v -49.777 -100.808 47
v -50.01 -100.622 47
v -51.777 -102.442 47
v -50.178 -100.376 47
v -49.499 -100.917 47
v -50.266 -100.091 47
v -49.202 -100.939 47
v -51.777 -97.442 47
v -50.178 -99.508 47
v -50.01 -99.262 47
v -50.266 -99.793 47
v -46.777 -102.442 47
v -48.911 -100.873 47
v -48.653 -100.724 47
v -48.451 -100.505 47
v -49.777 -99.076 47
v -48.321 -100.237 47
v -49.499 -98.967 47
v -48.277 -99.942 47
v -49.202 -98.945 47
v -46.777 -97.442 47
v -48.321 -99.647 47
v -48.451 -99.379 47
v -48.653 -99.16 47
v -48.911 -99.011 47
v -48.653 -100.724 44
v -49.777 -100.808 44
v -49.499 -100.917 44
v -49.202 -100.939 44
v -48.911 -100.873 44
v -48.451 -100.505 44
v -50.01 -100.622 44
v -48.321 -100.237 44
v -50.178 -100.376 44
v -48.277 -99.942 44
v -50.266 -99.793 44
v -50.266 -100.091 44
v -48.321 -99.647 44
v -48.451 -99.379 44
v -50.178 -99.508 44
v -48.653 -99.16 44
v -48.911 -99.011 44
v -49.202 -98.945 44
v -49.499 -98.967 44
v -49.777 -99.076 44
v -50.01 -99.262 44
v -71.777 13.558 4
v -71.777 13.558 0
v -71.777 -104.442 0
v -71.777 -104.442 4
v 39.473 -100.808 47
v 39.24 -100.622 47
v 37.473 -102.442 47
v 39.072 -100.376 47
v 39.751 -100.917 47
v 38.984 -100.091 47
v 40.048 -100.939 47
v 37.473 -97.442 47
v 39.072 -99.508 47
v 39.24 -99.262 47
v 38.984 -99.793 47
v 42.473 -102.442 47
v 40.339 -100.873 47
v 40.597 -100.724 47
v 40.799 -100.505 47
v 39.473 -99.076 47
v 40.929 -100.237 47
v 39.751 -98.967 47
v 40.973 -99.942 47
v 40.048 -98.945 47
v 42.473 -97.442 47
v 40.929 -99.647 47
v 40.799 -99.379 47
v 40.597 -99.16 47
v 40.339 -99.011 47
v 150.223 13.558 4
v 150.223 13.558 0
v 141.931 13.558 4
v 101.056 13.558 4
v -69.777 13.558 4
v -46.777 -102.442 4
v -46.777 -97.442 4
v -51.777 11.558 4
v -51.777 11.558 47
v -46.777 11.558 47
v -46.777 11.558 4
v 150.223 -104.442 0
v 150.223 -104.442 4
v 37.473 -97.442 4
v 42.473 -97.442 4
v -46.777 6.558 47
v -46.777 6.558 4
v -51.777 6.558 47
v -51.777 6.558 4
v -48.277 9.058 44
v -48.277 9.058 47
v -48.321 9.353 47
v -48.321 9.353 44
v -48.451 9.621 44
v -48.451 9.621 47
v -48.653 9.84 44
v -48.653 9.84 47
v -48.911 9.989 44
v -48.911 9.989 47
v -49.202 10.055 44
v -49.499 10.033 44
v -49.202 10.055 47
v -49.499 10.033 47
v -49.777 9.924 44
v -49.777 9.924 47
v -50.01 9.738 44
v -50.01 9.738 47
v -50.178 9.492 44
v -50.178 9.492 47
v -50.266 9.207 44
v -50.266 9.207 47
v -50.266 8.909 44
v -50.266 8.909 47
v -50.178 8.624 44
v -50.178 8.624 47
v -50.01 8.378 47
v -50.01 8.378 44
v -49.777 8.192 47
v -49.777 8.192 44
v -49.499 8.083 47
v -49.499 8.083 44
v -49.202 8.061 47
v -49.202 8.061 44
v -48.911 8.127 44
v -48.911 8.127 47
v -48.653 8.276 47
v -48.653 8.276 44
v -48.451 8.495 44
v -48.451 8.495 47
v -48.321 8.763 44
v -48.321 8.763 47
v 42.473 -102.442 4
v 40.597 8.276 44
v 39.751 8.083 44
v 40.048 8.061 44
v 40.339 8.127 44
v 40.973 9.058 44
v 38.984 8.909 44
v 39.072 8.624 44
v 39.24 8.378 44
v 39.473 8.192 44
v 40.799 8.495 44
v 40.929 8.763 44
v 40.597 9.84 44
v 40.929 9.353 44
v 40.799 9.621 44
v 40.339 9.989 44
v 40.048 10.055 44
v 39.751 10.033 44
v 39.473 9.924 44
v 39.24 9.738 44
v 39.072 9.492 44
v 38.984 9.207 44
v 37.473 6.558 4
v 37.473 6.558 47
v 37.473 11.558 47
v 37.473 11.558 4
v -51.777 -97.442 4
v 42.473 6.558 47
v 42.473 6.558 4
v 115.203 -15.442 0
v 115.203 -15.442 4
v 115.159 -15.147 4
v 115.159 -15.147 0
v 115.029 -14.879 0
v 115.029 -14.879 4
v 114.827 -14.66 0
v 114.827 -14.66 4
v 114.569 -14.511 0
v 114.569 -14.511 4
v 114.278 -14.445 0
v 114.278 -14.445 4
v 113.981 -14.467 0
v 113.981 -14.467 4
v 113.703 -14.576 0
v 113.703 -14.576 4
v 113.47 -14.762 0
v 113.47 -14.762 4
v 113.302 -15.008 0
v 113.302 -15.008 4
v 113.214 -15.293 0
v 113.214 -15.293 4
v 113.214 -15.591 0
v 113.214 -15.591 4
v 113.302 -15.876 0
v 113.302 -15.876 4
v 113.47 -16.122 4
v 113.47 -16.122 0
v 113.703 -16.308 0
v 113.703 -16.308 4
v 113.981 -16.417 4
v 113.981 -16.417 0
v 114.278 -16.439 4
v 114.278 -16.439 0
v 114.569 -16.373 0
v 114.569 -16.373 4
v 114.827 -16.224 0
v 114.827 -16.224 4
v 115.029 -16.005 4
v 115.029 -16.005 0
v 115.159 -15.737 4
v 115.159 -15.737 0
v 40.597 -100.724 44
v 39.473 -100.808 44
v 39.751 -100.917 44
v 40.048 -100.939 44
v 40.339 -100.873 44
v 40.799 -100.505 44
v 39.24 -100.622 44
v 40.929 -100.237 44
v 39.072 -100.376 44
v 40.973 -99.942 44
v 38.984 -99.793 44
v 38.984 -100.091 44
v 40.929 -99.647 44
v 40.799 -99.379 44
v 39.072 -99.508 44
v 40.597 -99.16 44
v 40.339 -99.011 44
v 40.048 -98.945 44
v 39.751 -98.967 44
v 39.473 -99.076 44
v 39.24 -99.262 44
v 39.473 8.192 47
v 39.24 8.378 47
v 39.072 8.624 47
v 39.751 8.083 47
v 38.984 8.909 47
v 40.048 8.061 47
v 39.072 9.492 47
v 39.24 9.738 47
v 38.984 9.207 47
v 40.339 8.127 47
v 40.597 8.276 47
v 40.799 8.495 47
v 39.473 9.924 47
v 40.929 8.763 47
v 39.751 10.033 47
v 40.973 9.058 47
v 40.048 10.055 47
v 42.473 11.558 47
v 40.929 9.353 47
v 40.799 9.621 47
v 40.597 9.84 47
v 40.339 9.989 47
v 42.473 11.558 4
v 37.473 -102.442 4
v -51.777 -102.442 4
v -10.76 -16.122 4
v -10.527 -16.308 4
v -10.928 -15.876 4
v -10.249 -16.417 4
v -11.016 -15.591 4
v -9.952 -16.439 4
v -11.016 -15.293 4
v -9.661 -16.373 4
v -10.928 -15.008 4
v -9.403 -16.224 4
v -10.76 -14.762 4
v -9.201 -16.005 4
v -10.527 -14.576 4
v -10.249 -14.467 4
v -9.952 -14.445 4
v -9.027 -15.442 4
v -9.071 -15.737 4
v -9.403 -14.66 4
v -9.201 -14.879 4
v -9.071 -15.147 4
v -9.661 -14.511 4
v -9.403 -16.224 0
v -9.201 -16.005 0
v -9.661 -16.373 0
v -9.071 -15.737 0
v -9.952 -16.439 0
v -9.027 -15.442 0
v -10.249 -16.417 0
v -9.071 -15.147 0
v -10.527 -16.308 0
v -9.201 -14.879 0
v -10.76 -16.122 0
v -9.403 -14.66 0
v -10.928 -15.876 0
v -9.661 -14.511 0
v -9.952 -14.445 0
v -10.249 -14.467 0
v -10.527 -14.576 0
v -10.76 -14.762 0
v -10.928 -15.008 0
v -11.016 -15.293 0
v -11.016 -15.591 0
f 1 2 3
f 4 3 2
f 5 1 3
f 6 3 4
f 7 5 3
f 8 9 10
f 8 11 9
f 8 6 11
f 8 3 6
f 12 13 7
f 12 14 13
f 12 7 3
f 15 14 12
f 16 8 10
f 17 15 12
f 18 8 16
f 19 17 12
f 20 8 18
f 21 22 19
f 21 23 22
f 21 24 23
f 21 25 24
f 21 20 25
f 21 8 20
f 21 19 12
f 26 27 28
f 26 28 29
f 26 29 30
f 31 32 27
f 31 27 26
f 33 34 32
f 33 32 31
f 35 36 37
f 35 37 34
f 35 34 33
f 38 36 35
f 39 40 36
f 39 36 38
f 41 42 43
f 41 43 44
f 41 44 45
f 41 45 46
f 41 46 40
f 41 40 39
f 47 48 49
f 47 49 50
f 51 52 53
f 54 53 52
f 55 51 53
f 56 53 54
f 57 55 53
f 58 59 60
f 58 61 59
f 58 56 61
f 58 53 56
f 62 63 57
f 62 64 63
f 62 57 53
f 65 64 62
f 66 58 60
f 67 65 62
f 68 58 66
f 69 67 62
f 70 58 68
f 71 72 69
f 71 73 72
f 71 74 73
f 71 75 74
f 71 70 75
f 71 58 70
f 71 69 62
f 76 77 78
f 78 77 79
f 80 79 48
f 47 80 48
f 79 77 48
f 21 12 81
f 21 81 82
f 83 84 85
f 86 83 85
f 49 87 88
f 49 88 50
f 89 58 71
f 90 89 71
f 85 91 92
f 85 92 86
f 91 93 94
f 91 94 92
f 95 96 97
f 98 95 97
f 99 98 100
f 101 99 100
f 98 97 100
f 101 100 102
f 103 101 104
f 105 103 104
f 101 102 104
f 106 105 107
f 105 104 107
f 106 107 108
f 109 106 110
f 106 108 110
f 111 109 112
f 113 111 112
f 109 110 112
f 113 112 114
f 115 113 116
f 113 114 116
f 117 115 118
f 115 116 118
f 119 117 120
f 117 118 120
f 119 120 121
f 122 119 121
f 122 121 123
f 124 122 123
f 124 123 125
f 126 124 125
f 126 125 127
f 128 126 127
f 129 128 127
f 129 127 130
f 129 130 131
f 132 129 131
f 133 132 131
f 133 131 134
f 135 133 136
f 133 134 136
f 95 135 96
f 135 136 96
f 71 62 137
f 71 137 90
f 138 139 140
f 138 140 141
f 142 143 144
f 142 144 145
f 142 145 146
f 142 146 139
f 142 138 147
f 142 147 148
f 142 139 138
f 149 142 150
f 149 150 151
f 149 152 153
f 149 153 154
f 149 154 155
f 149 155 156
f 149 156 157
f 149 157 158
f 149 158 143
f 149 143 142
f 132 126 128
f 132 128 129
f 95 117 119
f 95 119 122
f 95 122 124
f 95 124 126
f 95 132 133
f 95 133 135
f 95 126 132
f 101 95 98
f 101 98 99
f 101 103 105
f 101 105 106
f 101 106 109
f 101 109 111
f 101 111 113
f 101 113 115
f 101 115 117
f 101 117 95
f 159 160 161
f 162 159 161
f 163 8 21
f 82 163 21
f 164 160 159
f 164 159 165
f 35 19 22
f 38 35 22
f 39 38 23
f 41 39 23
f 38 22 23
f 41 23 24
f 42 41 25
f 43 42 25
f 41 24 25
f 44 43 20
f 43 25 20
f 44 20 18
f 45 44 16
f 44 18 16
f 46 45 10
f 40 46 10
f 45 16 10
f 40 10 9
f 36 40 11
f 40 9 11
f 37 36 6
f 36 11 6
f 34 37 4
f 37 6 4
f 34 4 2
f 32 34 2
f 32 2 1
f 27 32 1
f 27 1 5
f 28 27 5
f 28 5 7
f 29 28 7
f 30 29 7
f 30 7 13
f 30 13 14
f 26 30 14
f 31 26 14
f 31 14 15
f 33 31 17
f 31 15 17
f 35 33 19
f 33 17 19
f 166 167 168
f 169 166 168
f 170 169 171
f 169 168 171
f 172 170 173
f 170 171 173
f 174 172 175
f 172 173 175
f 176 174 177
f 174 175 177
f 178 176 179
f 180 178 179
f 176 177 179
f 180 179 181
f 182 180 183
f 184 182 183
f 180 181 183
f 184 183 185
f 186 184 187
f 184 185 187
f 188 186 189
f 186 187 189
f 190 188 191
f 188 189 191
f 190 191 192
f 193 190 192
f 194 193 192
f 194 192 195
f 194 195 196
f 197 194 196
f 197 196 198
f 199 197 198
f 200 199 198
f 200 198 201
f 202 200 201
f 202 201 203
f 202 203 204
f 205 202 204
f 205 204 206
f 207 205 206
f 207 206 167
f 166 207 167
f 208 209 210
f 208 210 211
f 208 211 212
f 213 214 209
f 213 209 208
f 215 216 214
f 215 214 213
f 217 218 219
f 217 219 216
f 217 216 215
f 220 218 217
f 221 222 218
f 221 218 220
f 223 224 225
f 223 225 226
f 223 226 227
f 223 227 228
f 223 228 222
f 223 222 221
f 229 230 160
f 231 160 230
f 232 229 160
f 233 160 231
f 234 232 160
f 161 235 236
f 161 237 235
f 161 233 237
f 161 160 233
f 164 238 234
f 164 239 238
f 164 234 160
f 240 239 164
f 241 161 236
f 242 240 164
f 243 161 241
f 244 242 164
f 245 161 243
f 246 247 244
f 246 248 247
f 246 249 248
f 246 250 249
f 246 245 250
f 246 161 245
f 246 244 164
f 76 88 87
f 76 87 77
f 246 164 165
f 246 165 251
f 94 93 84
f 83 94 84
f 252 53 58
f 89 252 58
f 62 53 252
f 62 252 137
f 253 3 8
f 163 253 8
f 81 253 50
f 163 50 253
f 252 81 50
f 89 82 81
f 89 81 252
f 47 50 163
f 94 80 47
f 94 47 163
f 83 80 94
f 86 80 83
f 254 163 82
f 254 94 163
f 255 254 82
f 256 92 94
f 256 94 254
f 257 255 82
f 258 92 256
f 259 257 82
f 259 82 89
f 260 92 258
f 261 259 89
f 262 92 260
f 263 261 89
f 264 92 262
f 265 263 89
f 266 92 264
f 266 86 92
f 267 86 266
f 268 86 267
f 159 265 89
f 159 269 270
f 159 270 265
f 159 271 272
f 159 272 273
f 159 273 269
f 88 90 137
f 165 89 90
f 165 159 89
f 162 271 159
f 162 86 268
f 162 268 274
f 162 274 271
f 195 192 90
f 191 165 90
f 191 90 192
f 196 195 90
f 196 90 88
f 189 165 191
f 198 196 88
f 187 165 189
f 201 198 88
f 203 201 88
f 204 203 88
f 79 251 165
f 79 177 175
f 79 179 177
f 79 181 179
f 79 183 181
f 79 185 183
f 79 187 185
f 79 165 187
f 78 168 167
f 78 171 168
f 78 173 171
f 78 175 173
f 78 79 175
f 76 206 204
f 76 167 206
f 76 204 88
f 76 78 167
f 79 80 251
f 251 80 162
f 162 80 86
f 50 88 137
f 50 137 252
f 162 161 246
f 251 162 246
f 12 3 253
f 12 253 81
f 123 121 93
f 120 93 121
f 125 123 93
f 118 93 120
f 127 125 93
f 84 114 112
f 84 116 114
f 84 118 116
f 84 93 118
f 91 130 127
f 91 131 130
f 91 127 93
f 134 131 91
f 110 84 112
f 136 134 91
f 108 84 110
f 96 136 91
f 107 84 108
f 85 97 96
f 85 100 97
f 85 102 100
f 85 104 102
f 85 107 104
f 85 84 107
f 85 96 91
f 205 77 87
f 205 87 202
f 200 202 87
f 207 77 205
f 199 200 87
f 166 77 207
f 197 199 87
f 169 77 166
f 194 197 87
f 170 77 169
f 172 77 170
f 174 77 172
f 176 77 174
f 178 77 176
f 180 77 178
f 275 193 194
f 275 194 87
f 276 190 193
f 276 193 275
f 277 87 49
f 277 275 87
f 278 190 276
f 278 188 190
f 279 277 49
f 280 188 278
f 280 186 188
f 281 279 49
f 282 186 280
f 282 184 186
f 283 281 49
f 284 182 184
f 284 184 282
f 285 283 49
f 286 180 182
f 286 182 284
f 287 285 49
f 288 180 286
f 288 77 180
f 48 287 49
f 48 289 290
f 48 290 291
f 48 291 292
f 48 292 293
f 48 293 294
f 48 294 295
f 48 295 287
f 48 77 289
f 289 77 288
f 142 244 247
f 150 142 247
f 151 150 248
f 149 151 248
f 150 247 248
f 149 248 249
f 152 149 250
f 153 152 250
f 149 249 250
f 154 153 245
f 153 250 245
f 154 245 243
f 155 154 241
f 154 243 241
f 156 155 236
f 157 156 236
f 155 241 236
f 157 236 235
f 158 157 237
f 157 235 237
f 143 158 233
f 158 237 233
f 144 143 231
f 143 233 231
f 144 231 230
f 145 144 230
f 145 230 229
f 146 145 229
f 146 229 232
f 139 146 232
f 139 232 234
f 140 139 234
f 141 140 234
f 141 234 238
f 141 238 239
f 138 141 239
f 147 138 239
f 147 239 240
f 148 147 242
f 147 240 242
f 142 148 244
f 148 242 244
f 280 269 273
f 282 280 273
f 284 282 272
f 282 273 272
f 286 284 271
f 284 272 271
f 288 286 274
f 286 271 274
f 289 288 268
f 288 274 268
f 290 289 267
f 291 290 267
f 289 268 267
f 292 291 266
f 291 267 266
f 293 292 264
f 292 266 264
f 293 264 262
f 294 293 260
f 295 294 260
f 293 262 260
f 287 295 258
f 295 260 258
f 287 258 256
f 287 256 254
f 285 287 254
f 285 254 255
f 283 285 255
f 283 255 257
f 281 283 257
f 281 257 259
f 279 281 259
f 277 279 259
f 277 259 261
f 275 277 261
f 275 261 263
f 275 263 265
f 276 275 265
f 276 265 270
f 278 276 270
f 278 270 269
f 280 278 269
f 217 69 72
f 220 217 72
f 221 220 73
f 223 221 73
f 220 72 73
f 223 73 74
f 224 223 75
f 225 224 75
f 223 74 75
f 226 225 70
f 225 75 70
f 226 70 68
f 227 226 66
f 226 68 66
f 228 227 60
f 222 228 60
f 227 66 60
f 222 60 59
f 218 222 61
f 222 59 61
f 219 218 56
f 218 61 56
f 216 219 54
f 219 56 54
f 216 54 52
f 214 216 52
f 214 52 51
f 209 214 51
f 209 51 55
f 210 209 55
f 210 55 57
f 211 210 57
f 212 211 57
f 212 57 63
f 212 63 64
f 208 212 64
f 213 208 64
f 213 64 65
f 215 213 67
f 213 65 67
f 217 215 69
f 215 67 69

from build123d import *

# Parameters (mm, degrees)
SKETCH1_W            = 200
SKETCH1_H            = 150
BOSS_EXTRUDE1_DEPTH  = 4
SKETCH2_W            = 4
SKETCH2_H            = 150
BOSS_EXTRUDE2_DEPTH  = 50
SKETCH3_R            = 1
CUT_EXTRUDE1_DEPTH   = 21
SKETCH4_R            = 1
CUT_EXTRUDE2_DEPTH   = 21
SKETCH5_R            = 1
CUT_EXTRUDE3_DEPTH   = 21
SKETCH6_R            = 1
CUT_EXTRUDE4_DEPTH   = 5
SKETCH7_R            = 6.144102529
BOSS_EXTRUDE3_DEPTH  = 4
SKETCH8_W            = 5
SKETCH8_H            = 5
BOSS_EXTRUDE4_DEPTH  = 43
SKETCH9_W            = 5
SKETCH9_H            = 5
BOSS_EXTRUDE5_DEPTH  = 43
SKETCH10_W           = 5
SKETCH10_H           = 5
BOSS_EXTRUDE6_DEPTH  = 43
SKETCH11_W           = 30
SKETCH11_H           = 150
CUT_EXTRUDE5_DEPTH   = 10
SKETCH12_W           = 220
SKETCH12_H           = 24.5
CUT_EXTRUDE6_DEPTH   = 10
SKETCH13_W           = 40.875499452
SKETCH13_H           = 23.792139599
SKETCH13_W_2         = 30.776846646
SKETCH13_H_2         = 32.17722556
CUT_EXTRUDE7_DEPTH   = 43
SKETCH14_W           = 220
SKETCH14_H           = 7.5
CUT_EXTRUDE8_DEPTH   = 10
SKETCH15_W           = 2
SKETCH15_H           = 118
BOSS_EXTRUDE7_DEPTH  = 47
SKETCH17_W           = 7
SKETCH17_H           = 7
BOSS_EXTRUDE8_DEPTH  = 10
SKETCH18_R           = 2.5
CUT_EXTRUDE9_DEPTH   = 9
SKETCH19_R           = 1
BOSS_EXTRUDE9_DEPTH  = 9
FILLET1_R            = 1
SKETCH20_W           = 7.2
SKETCH20_H           = 14.5
BOSS_EXTRUDE10_DEPTH = 10
SKETCH21_W           = 4.962321038
SKETCH21_H           = 12.373907849
CUT_EXTRUDE10_DEPTH  = 9
SKETCH22_W           = 0.777431132
SKETCH22_H           = 9.230205418
BOSS_EXTRUDE11_DEPTH = 8
SKETCH23_W           = 0.590875022
SKETCH23_H           = 0.8
SKETCH23_H_2         = 0.836280482
SKETCH23_H_3         = 0.787087512
BOSS_EXTRUDE12_DEPTH = 7
SKETCH24_W           = 5
SKETCH24_H           = 5
BOSS_EXTRUDE13_DEPTH = 43
SKETCH25_W           = 5
SKETCH25_H           = 5
BOSS_EXTRUDE14_DEPTH = 43
CUT_EXTRUDE11_START  = -43
SKETCH26_W           = 5
SKETCH26_H           = 5
CUT_EXTRUDE11_DEPTH  = 43
SKETCH27_W           = 5
SKETCH27_H           = 5
BOSS_EXTRUDE15_DEPTH = 43
CUT_EXTRUDE12_START  = -43
SKETCH28_W           = 5
SKETCH28_H           = 5
CUT_EXTRUDE12_DEPTH  = 43
SKETCH29_W           = 2
SKETCH29_H           = 66.409922273
BOSS_EXTRUDE16_DEPTH = 47
SKETCH30_W           = 8
SKETCH30_H           = 7
SKETCH30_H_2         = 14.5
CUT_EXTRUDE13_DEPTH  = 9.5
SKETCH31_W           = 5
SKETCH31_H           = 5
CUT_EXTRUDE14_DEPTH  = 43
SKETCH32_W           = 5
SKETCH32_H           = 5
BOSS_EXTRUDE17_DEPTH = 43
SKETCH35_W           = 5
SKETCH35_H           = 5
BOSS_EXTRUDE18_DEPTH = 43
SKETCH37_R           = 1
CUT_EXTRUDE16_DEPTH  = 3
CUT_EXTRUDE17_START  = -43
SKETCH38_W           = 2
SKETCH38_H           = 118
CUT_EXTRUDE17_DEPTH  = 43
SKETCH39_W           = 5
SKETCH39_H           = 5
BOSS_EXTRUDE19_DEPTH = 43
CUT_EXTRUDE18_START  = -43
SKETCH40_W           = 5
SKETCH40_H           = 5
CUT_EXTRUDE18_DEPTH  = 43
SKETCH41_R           = 1
CUT_EXTRUDE19_DEPTH  = 3
CUT_EXTRUDE20_START  = -43
SKETCH42_W           = 21.919538156
SKETCH42_H           = 26.204036761
CUT_EXTRUDE20_DEPTH  = 43
SKETCH43_W           = 59.077186418
SKETCH43_H           = 35.909235562
BOSS_EXTRUDE20_DEPTH = 4


with BuildPart() as part:
    # Sketch1 → Boss-Extrude1 (new body)
    with BuildSketch(Plane.XY):
        with Locations((0.223214286, -36.941964286)):
            Rectangle(SKETCH1_W, SKETCH1_H)
    extrude(amount=BOSS_EXTRUDE1_DEPTH)

    # Sketch2 → Boss-Extrude2 (add)
    with BuildSketch(Plane(origin=(100.223214286, 0, 0), x_dir=(0, 0, -1), z_dir=(1, 0, 0))):
        with Locations((-2, -36.941964286)):
            Rectangle(SKETCH2_W, SKETCH2_H)
    extrude(amount=BOSS_EXTRUDE2_DEPTH)

    # Sketch3 → Cut-Extrude1 (cut)
    with BuildSketch(Plane(origin=(0, 0, 0), x_dir=(-1, 0, 0), z_dir=(0, 0, -1))):
        with Locations((96.776785714, -77.941964286)):
            Circle(SKETCH3_R)
    extrude(amount=-CUT_EXTRUDE1_DEPTH, mode=Mode.SUBTRACT)

    # Sketch4 → Cut-Extrude2 (cut)
    with BuildSketch(Plane(origin=(0, 0, 0), x_dir=(-1, 0, 0), z_dir=(0, 0, -1))):
        with Locations((-147.223214286, -77.941964286)):
            Circle(SKETCH4_R)
    extrude(amount=-CUT_EXTRUDE2_DEPTH, mode=Mode.SUBTRACT)

    # Sketch5 → Cut-Extrude3 (cut)
    with BuildSketch(Plane(origin=(0, 0, 0), x_dir=(-1, 0, 0), z_dir=(0, 0, -1))):
        with Locations((-99.423214286, -77.941964286)):
            Circle(SKETCH5_R)
    extrude(amount=-CUT_EXTRUDE3_DEPTH, mode=Mode.SUBTRACT)

    # Sketch6 → Cut-Extrude4 (cut, through all)
    with BuildSketch(Plane.XY.offset(4)):
        with Locations((114.203214286, -15.441964286)):
            Circle(SKETCH6_R)
        with Locations((-10.026785714, -15.441964286)):
            Circle(SKETCH6_R)
    extrude(amount=-CUT_EXTRUDE4_DEPTH, mode=Mode.SUBTRACT)

    # Sketch7 → Boss-Extrude3 (add)
    with BuildSketch(Plane(origin=(0, 0, 0), x_dir=(-1, 0, 0), z_dir=(0, 0, -1))):
        with Locations((93.632683185, -80.249228077)):
            Circle(SKETCH7_R)
    extrude(amount=-BOSS_EXTRUDE3_DEPTH)

    # Sketch8 → Boss-Extrude4 (add)
    with BuildSketch(Plane.XY.offset(4)):
        with Locations((-10.026785714, 9.058035714)):
            Rectangle(SKETCH8_W, SKETCH8_H)
        with Locations((113.836980241, 9.058035714)):
            Rectangle(SKETCH8_W, SKETCH8_H)
    extrude(amount=BOSS_EXTRUDE4_DEPTH)

    # Sketch9 → Boss-Extrude5 (add)
    with BuildSketch(Plane.XY.offset(4)):
        with Locations((39.973214286, 9.058035714)):
            Rectangle(SKETCH9_W, SKETCH9_H)
    extrude(amount=BOSS_EXTRUDE5_DEPTH)

    # Sketch10 → Boss-Extrude6 (add)
    with BuildSketch(Plane.XY.offset(4)):
        with Locations((-65.026785714, 9.058035714)):
            Rectangle(SKETCH10_W, SKETCH10_H)
    extrude(amount=BOSS_EXTRUDE6_DEPTH)

    # Sketch11 → Cut-Extrude5 (cut)
    with BuildSketch(Plane.XY.offset(4)):
        with Locations((-84.776785714, -36.941964286)):
            Rectangle(SKETCH11_W, SKETCH11_H)
    extrude(amount=-CUT_EXTRUDE5_DEPTH, mode=Mode.SUBTRACT)

    # Sketch12 → Cut-Extrude6 (cut)
    with BuildSketch(Plane.XY.offset(4)):
        with Locations((40.223214286, 25.808035714)):
            Rectangle(SKETCH12_W, SKETCH12_H)
    extrude(amount=-CUT_EXTRUDE6_DEPTH, mode=Mode.SUBTRACT)

    # Sketch13 → Cut-Extrude7 (cut)
    with BuildSketch(Plane.XY.offset(47)):
        with Locations((121.493324961, 1.661965914)):
            Rectangle(SKETCH13_W, SKETCH13_H)
        with Locations((-5.461167455, 0)):
            Rectangle(SKETCH13_W_2, SKETCH13_H_2)
    extrude(amount=-CUT_EXTRUDE7_DEPTH, mode=Mode.SUBTRACT)

    # Sketch14 → Cut-Extrude8 (cut)
    with BuildSketch(Plane.XY.offset(4)):
        with Locations((40.223214286, -108.191964286)):
            Rectangle(SKETCH14_W, SKETCH14_H)
    extrude(amount=-CUT_EXTRUDE8_DEPTH, mode=Mode.SUBTRACT)

    # Sketch15 → Boss-Extrude7 (add)
    with BuildSketch(Plane(origin=(0, 0, 0), x_dir=(-1, 0, 0), z_dir=(0, 0, -1))):
        with Locations((70.776785714, -45.441964286)):
            Rectangle(SKETCH15_W, SKETCH15_H)
    extrude(amount=-BOSS_EXTRUDE7_DEPTH)

    # Sketch17 → Boss-Extrude8 (add)
    with BuildSketch(Plane.ZY.offset(71.776785714)):
        with Locations((10, -45.441964286)):
            Rectangle(SKETCH17_W, SKETCH17_H)
    extrude(amount=-BOSS_EXTRUDE8_DEPTH)

    # Sketch18 → Cut-Extrude9 (cut)
    with BuildSketch(Plane.ZY.offset(71.776785714)):
        with Locations((10, -45.441964286)):
            Circle(SKETCH18_R)
    extrude(amount=-CUT_EXTRUDE9_DEPTH, mode=Mode.SUBTRACT)

    # Sketch20 → Boss-Extrude10 (add)
    with BuildSketch(Plane.ZY.offset(71.776785714)):
        with Locations((9.71931332, -90.191964286)):
            Rectangle(SKETCH20_W, SKETCH20_H)
    extrude(amount=-BOSS_EXTRUDE10_DEPTH)

    # Sketch21 → Cut-Extrude10 (cut)
    with BuildSketch(Plane.ZY.offset(71.776785714)):
        with Locations((9.788933034, -90.191964286)):
            Rectangle(SKETCH21_W, SKETCH21_H)
    extrude(amount=-CUT_EXTRUDE10_DEPTH, mode=Mode.SUBTRACT)

    # Sketch22 → Boss-Extrude11 (add)
    with BuildSketch(Plane.ZY.offset(62.776785714)):
        with Locations((9.788933034, -90.191964286)):
            Rectangle(SKETCH22_W, SKETCH22_H)
    extrude(amount=BOSS_EXTRUDE11_DEPTH)

    # Sketch23 → Boss-Extrude12 (add)
    with BuildSketch(Plane.ZY.offset(62.776785714)):
        with Locations((10.473086111, -86.324413604)):
            Rectangle(SKETCH23_W, SKETCH23_H)
        with Locations((10.473086111, -88.407696998)):
            Rectangle(SKETCH23_W, SKETCH23_H_2)
        with Locations((10.473086111, -91.482257593)):
            Rectangle(SKETCH23_W, SKETCH23_H_3)
        with Locations((10.473086111, -93.720537707)):
            Rectangle(SKETCH23_W, SKETCH23_H_2)
    extrude(amount=BOSS_EXTRUDE12_DEPTH)

    # Sketch24 → Boss-Extrude13 (add)
    with BuildSketch(Plane.XY.offset(4)):
        with Locations((39.973214286, -39.941964286)):
            Rectangle(SKETCH24_W, SKETCH24_H)
    extrude(amount=BOSS_EXTRUDE13_DEPTH)

    # Sketch25 → Boss-Extrude14 (add)
    with BuildSketch(Plane.XY.offset(4)):
        with Locations((39.973214286, -65.941964286)):
            Rectangle(SKETCH25_W, SKETCH25_H)
        with Locations((-65.026785714, -65.941964286)):
            Rectangle(SKETCH25_W, SKETCH25_H)
    extrude(amount=BOSS_EXTRUDE14_DEPTH)

    # Sketch26 → Cut-Extrude11 (cut)
    with BuildSketch(Plane.XY.offset(47).offset(CUT_EXTRUDE11_START)):
        with Locations((39.973214286, -39.941964286)):
            Rectangle(SKETCH26_W, SKETCH26_H)
    extrude(amount=CUT_EXTRUDE11_DEPTH, mode=Mode.SUBTRACT)

    # Sketch27 → Boss-Extrude15 (add)
    with BuildSketch(Plane.XY.offset(4)):
        with Locations((39.973214286, -99.941964286)):
            Rectangle(SKETCH27_W, SKETCH27_H)
    extrude(amount=BOSS_EXTRUDE15_DEPTH)

    # Sketch28 → Cut-Extrude12 (cut)
    with BuildSketch(Plane.XY.offset(47).offset(CUT_EXTRUDE12_START)):
        with Locations((39.973214286, -65.941964286)):
            Rectangle(SKETCH28_W, SKETCH28_H)
    extrude(amount=CUT_EXTRUDE12_DEPTH, mode=Mode.SUBTRACT)



with BuildPart() as body_2:
    # Sketch19 → Boss-Extrude9 (new body)
    with BuildSketch(Plane.ZY.offset(62.776785714)):
        with Locations((10, -45.441964286)):
            Circle(SKETCH19_R)
    extrude(amount=BOSS_EXTRUDE9_DEPTH)

    # Fillet1
    fillet1_edges = [body_2.edges().sort_by_distance(p)[0] for p in [
        (-71.776785714, -45.441964286, 9),
    ]]
    fillet(fillet1_edges, radius=FILLET1_R)


with BuildPart() as part_1:
    add(part.part)

    add(body_2.part)  # Boss-Extrude16 merges body 2
    # Sketch29 → Boss-Extrude16 (add)
    with BuildSketch(Plane.XY.offset(47)):
        with Locations((-70.776785714, -71.237003149)):
            Rectangle(SKETCH29_W, SKETCH29_H)
    extrude(amount=-BOSS_EXTRUDE16_DEPTH)

    # Sketch30 → Cut-Extrude13 (cut)
    with BuildSketch(Plane.XY.offset(13.5)):
        with Locations((-65.776785714, -45.441964286)):
            Rectangle(SKETCH30_W, SKETCH30_H)
        with Locations((-65.776785714, -90.191964286)):
            Rectangle(SKETCH30_W, SKETCH30_H_2)
    extrude(amount=-CUT_EXTRUDE13_DEPTH, mode=Mode.SUBTRACT)

    # Sketch31 → Cut-Extrude14 (cut)
    with BuildSketch(Plane.XY.offset(47)):
        with Locations((-65.026785714, -65.941964286)):
            Rectangle(SKETCH31_W, SKETCH31_H)
    extrude(amount=-CUT_EXTRUDE14_DEPTH, mode=Mode.SUBTRACT)

    # Sketch32 → Boss-Extrude17 (add)
    with BuildSketch(Plane.XY.offset(4)):
        with Locations((-65.026785714, -99.941964286)):
            Rectangle(SKETCH32_W, SKETCH32_H)
    extrude(amount=BOSS_EXTRUDE17_DEPTH)

    # Sketch35 → Boss-Extrude18 (add)
    with BuildSketch(Plane.XY.offset(4)):
        with Locations((-12.526785714, -39.941964286)):
            Rectangle(SKETCH35_W, SKETCH35_H)
    extrude(amount=BOSS_EXTRUDE18_DEPTH)

    # Sketch37 → Cut-Extrude16 (cut)
    with BuildSketch(Plane.XY.offset(47)):
        with Locations((39.973214286, 9.058035714)):
            Circle(SKETCH37_R)
        with Locations((39.973214286, -99.941964286)):
            Circle(SKETCH37_R)
        with Locations((-65.026785714, -99.941964286)):
            Circle(SKETCH37_R)
        with Locations((-65.026785714, 9.058035714)):
            Circle(SKETCH37_R)
        with Locations((-12.526785714, -39.941964286)):
            Circle(SKETCH37_R)
    extrude(amount=-CUT_EXTRUDE16_DEPTH, mode=Mode.SUBTRACT)

    # Sketch38 → Cut-Extrude17 (cut)
    with BuildSketch(Plane.XY.offset(47).offset(CUT_EXTRUDE17_START)):
        with Locations((-70.776785714, -45.441964286)):
            Rectangle(SKETCH38_W, SKETCH38_H)
    extrude(amount=CUT_EXTRUDE17_DEPTH, mode=Mode.SUBTRACT)

    # Sketch39 → Boss-Extrude19 (add)
    with BuildSketch(Plane.XY.offset(4)):
        with Locations((-49.276785714, 9.058035714)):
            Rectangle(SKETCH39_W, SKETCH39_H)
        with Locations((-49.276785714, -99.941964286)):
            Rectangle(SKETCH39_W, SKETCH39_H)
    extrude(amount=BOSS_EXTRUDE19_DEPTH)

    # Sketch40 → Cut-Extrude18 (cut)
    with BuildSketch(Plane.XY.offset(47).offset(CUT_EXTRUDE18_START)):
        with Locations((-65.026785714, 9.058035714)):
            Rectangle(SKETCH40_W, SKETCH40_H)
        with Locations((-65.026785714, -99.941964286)):
            Rectangle(SKETCH40_W, SKETCH40_H)
    extrude(amount=CUT_EXTRUDE18_DEPTH, mode=Mode.SUBTRACT)

    # Sketch41 → Cut-Extrude19 (cut)
    with BuildSketch(Plane.XY.offset(47)):
        with Locations((-49.276785714, 9.058035714)):
            Circle(SKETCH41_R)
        with Locations((-49.276785714, -99.941964286)):
            Circle(SKETCH41_R)
    extrude(amount=-CUT_EXTRUDE19_DEPTH, mode=Mode.SUBTRACT)

    # Sketch42 → Cut-Extrude20 (cut)
    with BuildSketch(Plane.XY.offset(47).offset(CUT_EXTRUDE20_START)):
        with Locations((-10.959769078, -42.894349601)):
            Rectangle(SKETCH42_W, SKETCH42_H)
    extrude(amount=CUT_EXTRUDE20_DEPTH, mode=Mode.SUBTRACT)

    # Sketch43 → Boss-Extrude20 (add)
    with BuildSketch(Plane.XY.offset(4)):
        with Locations((120.684621077, -77.590435312)):
            Rectangle(SKETCH43_W, SKETCH43_H)
    extrude(amount=-BOSS_EXTRUDE20_DEPTH)


solid = part_1.part
